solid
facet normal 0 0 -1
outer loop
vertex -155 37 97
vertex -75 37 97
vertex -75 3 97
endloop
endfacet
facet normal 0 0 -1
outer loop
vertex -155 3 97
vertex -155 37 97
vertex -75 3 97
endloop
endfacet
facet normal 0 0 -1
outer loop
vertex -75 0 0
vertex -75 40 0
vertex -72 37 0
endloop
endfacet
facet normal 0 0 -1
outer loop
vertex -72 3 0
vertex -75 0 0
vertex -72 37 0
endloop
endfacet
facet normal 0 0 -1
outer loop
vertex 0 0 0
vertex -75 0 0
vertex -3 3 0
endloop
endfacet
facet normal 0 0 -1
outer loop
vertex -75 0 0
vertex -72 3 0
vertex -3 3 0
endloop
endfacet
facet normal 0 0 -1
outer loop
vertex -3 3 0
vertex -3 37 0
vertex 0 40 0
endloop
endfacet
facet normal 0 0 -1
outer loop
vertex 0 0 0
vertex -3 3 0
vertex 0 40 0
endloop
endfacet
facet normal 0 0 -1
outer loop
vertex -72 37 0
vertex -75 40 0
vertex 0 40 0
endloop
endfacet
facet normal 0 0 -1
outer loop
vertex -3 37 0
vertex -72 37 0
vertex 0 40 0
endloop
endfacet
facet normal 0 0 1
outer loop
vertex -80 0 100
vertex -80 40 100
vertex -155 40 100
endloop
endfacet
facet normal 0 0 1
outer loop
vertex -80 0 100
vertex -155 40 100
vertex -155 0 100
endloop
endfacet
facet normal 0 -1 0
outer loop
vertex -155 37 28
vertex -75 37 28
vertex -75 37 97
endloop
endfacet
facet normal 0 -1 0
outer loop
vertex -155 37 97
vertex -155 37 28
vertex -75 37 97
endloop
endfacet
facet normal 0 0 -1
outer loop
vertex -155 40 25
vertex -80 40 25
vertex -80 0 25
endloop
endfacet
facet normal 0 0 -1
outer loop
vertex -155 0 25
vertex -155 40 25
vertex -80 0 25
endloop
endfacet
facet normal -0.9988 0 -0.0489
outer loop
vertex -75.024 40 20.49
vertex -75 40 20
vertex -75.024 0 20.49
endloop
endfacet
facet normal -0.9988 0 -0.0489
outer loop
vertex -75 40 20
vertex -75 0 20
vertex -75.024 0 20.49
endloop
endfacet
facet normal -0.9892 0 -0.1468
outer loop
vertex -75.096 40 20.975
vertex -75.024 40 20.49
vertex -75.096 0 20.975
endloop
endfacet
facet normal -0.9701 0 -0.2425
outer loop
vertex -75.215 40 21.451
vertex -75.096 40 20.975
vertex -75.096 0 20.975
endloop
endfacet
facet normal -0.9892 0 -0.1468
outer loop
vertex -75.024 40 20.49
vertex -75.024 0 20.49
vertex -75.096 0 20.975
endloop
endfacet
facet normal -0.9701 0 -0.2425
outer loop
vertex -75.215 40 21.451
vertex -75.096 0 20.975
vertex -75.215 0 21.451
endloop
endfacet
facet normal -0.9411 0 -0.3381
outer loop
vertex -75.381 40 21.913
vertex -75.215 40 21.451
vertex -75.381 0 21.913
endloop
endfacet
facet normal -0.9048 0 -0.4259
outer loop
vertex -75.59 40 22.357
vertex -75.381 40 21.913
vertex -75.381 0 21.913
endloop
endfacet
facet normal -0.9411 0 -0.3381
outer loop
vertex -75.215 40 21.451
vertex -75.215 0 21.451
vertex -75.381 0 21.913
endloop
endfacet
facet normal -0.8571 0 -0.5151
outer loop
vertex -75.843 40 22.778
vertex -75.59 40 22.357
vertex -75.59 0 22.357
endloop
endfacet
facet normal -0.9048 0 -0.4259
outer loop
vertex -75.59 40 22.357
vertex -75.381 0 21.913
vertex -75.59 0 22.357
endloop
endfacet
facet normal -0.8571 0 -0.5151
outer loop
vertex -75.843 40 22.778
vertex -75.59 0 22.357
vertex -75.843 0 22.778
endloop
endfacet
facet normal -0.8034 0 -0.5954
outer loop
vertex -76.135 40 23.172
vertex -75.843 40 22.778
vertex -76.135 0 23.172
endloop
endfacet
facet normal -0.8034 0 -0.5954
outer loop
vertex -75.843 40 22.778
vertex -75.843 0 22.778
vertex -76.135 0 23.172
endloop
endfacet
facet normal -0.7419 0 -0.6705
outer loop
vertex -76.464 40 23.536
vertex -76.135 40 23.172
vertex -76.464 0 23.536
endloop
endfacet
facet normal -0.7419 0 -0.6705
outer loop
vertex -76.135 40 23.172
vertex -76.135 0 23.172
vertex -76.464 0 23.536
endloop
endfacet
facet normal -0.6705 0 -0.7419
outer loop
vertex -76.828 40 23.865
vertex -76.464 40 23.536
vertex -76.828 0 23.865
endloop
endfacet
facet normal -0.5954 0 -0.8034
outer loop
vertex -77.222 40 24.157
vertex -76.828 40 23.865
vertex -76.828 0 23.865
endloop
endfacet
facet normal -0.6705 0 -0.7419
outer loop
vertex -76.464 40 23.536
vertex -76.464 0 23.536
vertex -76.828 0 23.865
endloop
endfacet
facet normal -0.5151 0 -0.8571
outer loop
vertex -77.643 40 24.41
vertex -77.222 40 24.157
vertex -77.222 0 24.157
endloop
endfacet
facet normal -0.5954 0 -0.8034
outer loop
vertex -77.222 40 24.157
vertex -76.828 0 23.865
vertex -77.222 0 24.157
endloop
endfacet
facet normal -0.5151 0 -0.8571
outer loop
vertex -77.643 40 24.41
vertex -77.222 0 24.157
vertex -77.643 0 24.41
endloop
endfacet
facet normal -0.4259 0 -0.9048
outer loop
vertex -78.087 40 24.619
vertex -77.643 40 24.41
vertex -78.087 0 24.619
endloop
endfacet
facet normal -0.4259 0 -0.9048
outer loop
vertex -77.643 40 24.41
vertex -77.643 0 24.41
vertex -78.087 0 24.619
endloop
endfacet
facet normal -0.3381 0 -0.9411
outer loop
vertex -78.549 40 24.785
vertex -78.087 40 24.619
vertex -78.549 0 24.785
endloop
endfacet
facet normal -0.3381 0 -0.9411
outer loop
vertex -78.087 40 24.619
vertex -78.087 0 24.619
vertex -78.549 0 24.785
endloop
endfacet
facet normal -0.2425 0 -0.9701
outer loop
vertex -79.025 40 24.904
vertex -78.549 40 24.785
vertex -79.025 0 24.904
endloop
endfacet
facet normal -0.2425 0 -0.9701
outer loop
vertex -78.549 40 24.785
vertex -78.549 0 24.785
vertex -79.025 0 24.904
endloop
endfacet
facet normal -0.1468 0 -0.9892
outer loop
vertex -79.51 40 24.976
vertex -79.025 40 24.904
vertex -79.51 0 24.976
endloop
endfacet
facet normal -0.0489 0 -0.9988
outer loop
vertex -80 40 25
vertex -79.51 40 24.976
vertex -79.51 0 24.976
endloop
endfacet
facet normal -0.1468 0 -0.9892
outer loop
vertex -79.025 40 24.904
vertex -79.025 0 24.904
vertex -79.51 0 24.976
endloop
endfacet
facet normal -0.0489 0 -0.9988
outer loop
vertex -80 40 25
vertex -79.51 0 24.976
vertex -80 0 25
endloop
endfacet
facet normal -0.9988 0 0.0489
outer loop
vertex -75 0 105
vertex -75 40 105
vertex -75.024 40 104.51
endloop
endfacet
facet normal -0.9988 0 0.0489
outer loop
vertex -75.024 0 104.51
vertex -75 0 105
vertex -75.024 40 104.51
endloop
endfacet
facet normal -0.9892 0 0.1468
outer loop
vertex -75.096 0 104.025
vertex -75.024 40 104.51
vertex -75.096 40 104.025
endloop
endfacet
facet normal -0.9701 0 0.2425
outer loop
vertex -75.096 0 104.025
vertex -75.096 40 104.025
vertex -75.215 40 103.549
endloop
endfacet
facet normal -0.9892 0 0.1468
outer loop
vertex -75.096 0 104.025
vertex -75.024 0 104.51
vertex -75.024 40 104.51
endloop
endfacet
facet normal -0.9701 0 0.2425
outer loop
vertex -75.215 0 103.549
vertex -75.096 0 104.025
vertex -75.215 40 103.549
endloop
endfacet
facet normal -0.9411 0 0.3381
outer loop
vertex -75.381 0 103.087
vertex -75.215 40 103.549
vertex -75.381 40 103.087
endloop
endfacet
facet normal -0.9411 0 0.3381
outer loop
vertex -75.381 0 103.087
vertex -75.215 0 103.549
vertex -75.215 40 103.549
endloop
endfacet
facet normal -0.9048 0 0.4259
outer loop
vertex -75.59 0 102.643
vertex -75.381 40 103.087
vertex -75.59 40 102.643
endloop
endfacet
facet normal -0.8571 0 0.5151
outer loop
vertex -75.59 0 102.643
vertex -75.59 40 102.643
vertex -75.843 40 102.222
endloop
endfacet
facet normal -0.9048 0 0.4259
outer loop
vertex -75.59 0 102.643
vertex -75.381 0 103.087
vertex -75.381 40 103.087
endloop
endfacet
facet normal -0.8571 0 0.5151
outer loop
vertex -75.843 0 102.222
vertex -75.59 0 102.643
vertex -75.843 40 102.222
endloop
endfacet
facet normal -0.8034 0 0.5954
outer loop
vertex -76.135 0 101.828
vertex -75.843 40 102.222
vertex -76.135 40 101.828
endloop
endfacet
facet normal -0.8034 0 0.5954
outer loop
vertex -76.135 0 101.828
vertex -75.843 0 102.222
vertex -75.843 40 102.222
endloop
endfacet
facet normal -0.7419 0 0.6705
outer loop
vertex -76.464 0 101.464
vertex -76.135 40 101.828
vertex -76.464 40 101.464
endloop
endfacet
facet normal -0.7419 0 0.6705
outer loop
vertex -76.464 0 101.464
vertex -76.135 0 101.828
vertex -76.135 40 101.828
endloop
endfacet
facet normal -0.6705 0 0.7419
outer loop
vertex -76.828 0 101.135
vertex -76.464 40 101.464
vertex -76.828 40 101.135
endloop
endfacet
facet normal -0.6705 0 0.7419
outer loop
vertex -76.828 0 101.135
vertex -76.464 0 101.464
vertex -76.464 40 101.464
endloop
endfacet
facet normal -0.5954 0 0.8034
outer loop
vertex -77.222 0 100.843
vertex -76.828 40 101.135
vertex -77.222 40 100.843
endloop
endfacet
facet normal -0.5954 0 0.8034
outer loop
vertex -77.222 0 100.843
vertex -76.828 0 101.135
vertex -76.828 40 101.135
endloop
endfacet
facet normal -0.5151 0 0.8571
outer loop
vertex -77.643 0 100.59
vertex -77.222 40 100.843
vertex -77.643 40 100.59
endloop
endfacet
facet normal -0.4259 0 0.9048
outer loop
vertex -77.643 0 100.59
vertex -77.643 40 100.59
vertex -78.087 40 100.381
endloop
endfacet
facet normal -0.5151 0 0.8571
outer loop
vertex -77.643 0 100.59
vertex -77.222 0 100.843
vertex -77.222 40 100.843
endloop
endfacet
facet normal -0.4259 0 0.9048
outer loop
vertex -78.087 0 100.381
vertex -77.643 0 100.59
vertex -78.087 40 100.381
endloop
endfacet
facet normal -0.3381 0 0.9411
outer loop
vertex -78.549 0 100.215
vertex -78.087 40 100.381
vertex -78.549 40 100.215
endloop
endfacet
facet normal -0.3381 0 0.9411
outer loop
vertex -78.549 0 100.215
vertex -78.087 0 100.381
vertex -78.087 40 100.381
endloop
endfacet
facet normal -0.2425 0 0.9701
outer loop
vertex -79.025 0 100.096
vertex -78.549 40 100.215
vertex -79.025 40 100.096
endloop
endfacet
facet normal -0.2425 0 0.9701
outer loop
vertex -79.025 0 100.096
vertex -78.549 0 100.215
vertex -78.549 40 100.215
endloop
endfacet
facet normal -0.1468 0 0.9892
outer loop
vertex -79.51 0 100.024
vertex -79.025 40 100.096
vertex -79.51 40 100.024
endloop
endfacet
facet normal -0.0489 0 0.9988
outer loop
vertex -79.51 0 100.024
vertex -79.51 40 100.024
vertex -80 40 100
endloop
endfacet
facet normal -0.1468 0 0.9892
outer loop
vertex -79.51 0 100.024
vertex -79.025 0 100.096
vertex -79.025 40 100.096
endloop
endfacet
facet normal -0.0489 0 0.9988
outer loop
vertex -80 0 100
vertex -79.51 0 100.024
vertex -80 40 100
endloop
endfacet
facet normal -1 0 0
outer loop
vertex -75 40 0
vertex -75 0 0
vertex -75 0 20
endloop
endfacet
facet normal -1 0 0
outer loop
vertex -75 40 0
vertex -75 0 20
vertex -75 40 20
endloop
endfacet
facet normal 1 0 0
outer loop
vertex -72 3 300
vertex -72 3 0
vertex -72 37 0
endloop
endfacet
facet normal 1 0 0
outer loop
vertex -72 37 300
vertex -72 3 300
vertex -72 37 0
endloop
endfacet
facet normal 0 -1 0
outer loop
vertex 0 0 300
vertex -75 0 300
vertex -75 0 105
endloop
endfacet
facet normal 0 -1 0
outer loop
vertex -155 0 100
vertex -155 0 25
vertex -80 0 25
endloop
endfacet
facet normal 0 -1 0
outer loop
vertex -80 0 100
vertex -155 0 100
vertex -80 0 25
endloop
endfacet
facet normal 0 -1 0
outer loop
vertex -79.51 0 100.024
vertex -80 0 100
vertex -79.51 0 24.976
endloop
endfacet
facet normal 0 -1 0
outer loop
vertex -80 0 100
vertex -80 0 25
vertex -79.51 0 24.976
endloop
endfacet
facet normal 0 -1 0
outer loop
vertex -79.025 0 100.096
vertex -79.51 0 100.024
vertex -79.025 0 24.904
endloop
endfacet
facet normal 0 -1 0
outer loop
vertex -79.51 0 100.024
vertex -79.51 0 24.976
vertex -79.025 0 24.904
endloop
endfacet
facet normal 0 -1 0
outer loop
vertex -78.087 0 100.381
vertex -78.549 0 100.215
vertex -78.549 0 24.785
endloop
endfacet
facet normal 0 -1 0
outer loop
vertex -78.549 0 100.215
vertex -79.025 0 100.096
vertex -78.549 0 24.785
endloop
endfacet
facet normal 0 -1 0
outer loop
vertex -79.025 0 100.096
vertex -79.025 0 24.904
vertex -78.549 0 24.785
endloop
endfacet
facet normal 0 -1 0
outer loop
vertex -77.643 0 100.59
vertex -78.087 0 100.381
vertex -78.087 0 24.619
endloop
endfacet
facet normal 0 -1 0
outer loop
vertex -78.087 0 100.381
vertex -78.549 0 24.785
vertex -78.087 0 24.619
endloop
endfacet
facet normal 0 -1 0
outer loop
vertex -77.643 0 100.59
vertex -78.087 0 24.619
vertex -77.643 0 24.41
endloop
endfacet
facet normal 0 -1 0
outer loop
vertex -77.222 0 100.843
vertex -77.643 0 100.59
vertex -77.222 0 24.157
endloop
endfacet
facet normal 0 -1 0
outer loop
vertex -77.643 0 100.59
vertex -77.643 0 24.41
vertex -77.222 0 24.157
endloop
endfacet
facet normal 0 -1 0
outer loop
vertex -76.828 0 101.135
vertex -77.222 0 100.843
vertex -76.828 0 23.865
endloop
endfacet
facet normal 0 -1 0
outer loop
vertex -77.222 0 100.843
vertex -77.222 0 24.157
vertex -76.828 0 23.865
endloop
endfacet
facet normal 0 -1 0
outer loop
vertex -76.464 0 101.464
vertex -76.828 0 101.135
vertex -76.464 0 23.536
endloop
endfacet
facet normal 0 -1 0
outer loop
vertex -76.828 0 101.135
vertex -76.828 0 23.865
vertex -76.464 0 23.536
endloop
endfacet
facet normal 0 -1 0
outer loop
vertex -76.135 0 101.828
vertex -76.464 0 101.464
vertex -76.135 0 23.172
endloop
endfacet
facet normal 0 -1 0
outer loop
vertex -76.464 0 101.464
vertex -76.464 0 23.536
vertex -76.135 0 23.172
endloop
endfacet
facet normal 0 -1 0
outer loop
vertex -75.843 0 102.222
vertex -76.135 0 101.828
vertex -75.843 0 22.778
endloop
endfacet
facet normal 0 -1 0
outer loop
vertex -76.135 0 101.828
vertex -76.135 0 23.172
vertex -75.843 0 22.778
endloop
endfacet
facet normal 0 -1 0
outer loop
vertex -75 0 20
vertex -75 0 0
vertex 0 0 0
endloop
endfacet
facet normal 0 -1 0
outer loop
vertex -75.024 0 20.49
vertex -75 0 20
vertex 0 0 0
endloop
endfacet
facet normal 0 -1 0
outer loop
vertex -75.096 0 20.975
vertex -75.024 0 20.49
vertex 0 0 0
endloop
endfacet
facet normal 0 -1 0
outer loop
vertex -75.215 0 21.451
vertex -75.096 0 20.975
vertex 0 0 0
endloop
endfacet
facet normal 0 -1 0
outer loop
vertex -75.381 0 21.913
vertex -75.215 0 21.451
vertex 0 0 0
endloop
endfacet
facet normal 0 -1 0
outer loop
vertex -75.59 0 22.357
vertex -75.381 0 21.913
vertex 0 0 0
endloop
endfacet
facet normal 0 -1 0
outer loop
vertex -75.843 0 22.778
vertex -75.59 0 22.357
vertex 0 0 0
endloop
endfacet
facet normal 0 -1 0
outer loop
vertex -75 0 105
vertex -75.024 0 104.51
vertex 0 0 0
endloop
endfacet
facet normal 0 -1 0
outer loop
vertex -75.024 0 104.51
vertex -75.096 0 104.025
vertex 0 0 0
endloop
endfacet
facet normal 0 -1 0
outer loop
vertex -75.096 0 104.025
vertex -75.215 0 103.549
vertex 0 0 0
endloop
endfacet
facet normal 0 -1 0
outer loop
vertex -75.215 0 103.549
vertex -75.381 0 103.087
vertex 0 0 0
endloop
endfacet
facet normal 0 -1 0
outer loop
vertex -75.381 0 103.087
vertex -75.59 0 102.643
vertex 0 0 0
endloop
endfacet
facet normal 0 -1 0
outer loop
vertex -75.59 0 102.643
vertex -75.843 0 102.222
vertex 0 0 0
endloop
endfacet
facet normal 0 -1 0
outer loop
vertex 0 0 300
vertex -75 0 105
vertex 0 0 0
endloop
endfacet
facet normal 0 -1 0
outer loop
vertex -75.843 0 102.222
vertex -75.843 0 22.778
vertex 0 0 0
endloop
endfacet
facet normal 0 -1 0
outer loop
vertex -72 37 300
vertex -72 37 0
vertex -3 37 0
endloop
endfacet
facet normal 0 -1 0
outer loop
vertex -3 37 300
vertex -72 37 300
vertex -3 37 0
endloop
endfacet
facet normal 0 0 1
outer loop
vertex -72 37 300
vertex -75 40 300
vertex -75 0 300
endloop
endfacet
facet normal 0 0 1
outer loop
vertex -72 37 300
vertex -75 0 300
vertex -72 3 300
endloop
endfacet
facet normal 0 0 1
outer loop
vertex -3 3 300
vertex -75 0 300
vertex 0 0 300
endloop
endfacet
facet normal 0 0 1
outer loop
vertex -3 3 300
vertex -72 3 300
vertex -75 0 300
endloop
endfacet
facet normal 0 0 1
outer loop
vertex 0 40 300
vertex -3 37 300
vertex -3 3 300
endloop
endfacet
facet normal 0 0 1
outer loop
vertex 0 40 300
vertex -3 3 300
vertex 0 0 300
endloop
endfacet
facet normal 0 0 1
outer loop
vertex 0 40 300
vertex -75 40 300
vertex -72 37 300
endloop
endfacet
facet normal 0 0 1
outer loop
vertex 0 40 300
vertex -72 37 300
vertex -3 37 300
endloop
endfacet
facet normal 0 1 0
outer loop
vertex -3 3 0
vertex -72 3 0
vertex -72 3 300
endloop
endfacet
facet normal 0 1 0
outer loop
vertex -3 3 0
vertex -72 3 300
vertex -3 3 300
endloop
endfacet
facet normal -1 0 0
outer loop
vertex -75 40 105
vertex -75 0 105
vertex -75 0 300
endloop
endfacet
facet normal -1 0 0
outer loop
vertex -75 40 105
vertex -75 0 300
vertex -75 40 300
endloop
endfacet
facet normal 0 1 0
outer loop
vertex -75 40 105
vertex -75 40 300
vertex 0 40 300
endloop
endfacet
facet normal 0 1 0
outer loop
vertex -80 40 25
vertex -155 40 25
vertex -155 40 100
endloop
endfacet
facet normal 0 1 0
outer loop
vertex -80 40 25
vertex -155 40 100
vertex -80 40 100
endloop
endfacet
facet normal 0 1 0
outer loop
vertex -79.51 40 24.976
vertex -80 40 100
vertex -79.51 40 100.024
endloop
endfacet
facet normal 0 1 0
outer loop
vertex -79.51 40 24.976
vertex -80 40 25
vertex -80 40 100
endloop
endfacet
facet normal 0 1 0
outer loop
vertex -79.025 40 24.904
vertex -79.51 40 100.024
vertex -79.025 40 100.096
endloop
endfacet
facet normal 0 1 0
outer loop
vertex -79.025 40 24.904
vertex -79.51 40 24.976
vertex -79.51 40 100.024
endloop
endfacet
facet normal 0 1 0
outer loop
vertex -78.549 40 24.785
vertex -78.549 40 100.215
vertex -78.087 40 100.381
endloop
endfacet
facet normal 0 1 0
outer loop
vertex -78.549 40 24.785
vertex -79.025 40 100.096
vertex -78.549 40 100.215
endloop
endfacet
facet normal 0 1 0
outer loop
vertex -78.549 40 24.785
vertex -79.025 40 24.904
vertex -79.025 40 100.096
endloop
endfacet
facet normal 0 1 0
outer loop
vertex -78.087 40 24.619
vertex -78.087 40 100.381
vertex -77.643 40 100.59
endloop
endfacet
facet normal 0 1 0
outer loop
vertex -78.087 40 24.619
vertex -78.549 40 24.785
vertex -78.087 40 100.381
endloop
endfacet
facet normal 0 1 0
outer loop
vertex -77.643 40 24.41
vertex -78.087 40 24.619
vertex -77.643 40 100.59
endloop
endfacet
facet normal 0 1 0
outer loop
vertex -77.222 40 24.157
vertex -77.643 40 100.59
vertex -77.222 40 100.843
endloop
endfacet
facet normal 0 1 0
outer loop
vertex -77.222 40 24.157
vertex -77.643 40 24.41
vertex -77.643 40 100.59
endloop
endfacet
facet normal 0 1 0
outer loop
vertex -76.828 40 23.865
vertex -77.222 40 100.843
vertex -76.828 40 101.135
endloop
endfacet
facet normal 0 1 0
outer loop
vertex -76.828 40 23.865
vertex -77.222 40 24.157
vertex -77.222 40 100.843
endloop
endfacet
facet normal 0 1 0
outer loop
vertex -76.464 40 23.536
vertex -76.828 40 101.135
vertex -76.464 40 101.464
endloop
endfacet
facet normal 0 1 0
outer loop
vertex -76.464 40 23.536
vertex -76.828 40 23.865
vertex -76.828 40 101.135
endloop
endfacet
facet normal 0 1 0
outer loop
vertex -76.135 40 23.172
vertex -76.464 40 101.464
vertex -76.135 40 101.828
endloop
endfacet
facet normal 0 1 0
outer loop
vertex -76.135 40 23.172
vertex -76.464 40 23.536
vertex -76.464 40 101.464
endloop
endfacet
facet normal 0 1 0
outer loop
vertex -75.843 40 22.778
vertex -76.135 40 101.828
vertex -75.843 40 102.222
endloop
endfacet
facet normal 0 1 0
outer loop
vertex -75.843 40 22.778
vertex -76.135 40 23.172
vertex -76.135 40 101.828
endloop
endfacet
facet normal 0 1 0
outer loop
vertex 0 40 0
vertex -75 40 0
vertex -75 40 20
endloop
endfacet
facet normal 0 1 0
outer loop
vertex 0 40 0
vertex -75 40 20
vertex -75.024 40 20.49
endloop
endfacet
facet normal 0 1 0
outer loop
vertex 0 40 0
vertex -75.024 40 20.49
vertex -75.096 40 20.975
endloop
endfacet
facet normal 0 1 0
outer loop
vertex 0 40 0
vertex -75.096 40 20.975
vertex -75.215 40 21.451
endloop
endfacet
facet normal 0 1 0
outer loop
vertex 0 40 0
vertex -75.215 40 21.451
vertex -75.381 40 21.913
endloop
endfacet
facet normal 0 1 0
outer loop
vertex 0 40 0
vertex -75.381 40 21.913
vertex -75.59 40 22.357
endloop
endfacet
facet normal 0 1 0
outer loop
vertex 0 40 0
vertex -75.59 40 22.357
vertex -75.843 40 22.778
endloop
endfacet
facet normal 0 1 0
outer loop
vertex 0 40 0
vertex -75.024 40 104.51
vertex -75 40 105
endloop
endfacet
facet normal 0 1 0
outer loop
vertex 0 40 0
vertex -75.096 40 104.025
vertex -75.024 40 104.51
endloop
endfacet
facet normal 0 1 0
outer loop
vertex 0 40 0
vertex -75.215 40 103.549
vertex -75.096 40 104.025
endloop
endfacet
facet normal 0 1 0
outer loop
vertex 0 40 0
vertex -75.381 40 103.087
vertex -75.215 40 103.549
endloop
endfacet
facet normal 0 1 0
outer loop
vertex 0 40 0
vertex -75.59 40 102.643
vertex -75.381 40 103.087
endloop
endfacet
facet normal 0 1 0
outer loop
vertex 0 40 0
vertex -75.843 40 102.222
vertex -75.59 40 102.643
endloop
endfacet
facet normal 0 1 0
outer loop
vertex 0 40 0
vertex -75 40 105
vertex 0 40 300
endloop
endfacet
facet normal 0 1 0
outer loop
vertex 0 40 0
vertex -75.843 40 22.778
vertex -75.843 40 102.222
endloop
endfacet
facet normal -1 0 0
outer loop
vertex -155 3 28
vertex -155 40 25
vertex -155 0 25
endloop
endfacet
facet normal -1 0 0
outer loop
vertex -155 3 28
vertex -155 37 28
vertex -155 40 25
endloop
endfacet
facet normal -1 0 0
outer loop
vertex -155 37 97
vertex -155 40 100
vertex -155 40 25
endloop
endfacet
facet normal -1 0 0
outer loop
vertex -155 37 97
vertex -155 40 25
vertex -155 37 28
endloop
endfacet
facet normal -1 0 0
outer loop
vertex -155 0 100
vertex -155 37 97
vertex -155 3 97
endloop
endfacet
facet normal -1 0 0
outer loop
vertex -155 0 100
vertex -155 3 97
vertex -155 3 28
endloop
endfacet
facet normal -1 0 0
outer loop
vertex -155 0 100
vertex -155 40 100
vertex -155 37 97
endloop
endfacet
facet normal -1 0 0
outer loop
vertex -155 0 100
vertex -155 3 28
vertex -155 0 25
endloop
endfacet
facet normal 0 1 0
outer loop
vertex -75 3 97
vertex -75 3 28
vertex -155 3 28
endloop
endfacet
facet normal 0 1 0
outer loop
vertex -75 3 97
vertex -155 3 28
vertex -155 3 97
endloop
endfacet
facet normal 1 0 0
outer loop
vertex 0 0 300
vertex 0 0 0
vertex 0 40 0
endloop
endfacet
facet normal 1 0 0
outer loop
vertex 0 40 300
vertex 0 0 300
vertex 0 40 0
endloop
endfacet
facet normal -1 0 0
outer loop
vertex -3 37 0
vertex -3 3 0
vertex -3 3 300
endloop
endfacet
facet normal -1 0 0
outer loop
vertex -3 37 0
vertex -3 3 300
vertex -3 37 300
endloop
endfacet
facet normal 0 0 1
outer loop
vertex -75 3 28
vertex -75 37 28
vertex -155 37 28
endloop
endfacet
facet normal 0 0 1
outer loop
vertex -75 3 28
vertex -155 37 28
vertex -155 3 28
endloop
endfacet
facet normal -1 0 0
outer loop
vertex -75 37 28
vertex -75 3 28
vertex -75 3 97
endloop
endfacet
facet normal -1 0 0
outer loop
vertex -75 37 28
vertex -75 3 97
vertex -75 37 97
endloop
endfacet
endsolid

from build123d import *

# Parameters (mm, degrees)
F0_W     = 75
F0_H     = 40
F0_W_2   = 69
F0_H_2   = 34
F1_DEPTH = 300
F2_W     = 40
F2_H     = 75
F2_W_2   = 34
F2_H_2   = 69
F3_DEPTH = 80
F4_R     = 5


with BuildPart() as f1:
    # F0 (on Top) → F1 (new body)
    with BuildSketch(Plane.XY):
        with Locations((-37.5, 20)):
            Rectangle(F0_W, F0_H)
        with Locations((-37.5, 20)):
            Rectangle(F0_W_2, F0_H_2, mode=Mode.SUBTRACT)
    extrude(amount=F1_DEPTH)

    # F2 (on face) → F3 (join)
    with BuildSketch(Plane(origin=(-75, 0, 0), x_dir=(0, -1, 0), z_dir=(-1, 0, 0))):
        with Locations((-20, 62.5)):
            Rectangle(F2_W, F2_H)
        with Locations((-20, 62.5)):
            Rectangle(F2_W_2, F2_H_2, mode=Mode.SUBTRACT)
    extrude(amount=F3_DEPTH)

    # F4
    f4_edges = [f1.edges().sort_by_distance(p)[0] for p in [
        (-75, 20, 100),
        (-75, 20, 25),
    ]]
    fillet(f4_edges, radius=F4_R)


solid = f1.part
